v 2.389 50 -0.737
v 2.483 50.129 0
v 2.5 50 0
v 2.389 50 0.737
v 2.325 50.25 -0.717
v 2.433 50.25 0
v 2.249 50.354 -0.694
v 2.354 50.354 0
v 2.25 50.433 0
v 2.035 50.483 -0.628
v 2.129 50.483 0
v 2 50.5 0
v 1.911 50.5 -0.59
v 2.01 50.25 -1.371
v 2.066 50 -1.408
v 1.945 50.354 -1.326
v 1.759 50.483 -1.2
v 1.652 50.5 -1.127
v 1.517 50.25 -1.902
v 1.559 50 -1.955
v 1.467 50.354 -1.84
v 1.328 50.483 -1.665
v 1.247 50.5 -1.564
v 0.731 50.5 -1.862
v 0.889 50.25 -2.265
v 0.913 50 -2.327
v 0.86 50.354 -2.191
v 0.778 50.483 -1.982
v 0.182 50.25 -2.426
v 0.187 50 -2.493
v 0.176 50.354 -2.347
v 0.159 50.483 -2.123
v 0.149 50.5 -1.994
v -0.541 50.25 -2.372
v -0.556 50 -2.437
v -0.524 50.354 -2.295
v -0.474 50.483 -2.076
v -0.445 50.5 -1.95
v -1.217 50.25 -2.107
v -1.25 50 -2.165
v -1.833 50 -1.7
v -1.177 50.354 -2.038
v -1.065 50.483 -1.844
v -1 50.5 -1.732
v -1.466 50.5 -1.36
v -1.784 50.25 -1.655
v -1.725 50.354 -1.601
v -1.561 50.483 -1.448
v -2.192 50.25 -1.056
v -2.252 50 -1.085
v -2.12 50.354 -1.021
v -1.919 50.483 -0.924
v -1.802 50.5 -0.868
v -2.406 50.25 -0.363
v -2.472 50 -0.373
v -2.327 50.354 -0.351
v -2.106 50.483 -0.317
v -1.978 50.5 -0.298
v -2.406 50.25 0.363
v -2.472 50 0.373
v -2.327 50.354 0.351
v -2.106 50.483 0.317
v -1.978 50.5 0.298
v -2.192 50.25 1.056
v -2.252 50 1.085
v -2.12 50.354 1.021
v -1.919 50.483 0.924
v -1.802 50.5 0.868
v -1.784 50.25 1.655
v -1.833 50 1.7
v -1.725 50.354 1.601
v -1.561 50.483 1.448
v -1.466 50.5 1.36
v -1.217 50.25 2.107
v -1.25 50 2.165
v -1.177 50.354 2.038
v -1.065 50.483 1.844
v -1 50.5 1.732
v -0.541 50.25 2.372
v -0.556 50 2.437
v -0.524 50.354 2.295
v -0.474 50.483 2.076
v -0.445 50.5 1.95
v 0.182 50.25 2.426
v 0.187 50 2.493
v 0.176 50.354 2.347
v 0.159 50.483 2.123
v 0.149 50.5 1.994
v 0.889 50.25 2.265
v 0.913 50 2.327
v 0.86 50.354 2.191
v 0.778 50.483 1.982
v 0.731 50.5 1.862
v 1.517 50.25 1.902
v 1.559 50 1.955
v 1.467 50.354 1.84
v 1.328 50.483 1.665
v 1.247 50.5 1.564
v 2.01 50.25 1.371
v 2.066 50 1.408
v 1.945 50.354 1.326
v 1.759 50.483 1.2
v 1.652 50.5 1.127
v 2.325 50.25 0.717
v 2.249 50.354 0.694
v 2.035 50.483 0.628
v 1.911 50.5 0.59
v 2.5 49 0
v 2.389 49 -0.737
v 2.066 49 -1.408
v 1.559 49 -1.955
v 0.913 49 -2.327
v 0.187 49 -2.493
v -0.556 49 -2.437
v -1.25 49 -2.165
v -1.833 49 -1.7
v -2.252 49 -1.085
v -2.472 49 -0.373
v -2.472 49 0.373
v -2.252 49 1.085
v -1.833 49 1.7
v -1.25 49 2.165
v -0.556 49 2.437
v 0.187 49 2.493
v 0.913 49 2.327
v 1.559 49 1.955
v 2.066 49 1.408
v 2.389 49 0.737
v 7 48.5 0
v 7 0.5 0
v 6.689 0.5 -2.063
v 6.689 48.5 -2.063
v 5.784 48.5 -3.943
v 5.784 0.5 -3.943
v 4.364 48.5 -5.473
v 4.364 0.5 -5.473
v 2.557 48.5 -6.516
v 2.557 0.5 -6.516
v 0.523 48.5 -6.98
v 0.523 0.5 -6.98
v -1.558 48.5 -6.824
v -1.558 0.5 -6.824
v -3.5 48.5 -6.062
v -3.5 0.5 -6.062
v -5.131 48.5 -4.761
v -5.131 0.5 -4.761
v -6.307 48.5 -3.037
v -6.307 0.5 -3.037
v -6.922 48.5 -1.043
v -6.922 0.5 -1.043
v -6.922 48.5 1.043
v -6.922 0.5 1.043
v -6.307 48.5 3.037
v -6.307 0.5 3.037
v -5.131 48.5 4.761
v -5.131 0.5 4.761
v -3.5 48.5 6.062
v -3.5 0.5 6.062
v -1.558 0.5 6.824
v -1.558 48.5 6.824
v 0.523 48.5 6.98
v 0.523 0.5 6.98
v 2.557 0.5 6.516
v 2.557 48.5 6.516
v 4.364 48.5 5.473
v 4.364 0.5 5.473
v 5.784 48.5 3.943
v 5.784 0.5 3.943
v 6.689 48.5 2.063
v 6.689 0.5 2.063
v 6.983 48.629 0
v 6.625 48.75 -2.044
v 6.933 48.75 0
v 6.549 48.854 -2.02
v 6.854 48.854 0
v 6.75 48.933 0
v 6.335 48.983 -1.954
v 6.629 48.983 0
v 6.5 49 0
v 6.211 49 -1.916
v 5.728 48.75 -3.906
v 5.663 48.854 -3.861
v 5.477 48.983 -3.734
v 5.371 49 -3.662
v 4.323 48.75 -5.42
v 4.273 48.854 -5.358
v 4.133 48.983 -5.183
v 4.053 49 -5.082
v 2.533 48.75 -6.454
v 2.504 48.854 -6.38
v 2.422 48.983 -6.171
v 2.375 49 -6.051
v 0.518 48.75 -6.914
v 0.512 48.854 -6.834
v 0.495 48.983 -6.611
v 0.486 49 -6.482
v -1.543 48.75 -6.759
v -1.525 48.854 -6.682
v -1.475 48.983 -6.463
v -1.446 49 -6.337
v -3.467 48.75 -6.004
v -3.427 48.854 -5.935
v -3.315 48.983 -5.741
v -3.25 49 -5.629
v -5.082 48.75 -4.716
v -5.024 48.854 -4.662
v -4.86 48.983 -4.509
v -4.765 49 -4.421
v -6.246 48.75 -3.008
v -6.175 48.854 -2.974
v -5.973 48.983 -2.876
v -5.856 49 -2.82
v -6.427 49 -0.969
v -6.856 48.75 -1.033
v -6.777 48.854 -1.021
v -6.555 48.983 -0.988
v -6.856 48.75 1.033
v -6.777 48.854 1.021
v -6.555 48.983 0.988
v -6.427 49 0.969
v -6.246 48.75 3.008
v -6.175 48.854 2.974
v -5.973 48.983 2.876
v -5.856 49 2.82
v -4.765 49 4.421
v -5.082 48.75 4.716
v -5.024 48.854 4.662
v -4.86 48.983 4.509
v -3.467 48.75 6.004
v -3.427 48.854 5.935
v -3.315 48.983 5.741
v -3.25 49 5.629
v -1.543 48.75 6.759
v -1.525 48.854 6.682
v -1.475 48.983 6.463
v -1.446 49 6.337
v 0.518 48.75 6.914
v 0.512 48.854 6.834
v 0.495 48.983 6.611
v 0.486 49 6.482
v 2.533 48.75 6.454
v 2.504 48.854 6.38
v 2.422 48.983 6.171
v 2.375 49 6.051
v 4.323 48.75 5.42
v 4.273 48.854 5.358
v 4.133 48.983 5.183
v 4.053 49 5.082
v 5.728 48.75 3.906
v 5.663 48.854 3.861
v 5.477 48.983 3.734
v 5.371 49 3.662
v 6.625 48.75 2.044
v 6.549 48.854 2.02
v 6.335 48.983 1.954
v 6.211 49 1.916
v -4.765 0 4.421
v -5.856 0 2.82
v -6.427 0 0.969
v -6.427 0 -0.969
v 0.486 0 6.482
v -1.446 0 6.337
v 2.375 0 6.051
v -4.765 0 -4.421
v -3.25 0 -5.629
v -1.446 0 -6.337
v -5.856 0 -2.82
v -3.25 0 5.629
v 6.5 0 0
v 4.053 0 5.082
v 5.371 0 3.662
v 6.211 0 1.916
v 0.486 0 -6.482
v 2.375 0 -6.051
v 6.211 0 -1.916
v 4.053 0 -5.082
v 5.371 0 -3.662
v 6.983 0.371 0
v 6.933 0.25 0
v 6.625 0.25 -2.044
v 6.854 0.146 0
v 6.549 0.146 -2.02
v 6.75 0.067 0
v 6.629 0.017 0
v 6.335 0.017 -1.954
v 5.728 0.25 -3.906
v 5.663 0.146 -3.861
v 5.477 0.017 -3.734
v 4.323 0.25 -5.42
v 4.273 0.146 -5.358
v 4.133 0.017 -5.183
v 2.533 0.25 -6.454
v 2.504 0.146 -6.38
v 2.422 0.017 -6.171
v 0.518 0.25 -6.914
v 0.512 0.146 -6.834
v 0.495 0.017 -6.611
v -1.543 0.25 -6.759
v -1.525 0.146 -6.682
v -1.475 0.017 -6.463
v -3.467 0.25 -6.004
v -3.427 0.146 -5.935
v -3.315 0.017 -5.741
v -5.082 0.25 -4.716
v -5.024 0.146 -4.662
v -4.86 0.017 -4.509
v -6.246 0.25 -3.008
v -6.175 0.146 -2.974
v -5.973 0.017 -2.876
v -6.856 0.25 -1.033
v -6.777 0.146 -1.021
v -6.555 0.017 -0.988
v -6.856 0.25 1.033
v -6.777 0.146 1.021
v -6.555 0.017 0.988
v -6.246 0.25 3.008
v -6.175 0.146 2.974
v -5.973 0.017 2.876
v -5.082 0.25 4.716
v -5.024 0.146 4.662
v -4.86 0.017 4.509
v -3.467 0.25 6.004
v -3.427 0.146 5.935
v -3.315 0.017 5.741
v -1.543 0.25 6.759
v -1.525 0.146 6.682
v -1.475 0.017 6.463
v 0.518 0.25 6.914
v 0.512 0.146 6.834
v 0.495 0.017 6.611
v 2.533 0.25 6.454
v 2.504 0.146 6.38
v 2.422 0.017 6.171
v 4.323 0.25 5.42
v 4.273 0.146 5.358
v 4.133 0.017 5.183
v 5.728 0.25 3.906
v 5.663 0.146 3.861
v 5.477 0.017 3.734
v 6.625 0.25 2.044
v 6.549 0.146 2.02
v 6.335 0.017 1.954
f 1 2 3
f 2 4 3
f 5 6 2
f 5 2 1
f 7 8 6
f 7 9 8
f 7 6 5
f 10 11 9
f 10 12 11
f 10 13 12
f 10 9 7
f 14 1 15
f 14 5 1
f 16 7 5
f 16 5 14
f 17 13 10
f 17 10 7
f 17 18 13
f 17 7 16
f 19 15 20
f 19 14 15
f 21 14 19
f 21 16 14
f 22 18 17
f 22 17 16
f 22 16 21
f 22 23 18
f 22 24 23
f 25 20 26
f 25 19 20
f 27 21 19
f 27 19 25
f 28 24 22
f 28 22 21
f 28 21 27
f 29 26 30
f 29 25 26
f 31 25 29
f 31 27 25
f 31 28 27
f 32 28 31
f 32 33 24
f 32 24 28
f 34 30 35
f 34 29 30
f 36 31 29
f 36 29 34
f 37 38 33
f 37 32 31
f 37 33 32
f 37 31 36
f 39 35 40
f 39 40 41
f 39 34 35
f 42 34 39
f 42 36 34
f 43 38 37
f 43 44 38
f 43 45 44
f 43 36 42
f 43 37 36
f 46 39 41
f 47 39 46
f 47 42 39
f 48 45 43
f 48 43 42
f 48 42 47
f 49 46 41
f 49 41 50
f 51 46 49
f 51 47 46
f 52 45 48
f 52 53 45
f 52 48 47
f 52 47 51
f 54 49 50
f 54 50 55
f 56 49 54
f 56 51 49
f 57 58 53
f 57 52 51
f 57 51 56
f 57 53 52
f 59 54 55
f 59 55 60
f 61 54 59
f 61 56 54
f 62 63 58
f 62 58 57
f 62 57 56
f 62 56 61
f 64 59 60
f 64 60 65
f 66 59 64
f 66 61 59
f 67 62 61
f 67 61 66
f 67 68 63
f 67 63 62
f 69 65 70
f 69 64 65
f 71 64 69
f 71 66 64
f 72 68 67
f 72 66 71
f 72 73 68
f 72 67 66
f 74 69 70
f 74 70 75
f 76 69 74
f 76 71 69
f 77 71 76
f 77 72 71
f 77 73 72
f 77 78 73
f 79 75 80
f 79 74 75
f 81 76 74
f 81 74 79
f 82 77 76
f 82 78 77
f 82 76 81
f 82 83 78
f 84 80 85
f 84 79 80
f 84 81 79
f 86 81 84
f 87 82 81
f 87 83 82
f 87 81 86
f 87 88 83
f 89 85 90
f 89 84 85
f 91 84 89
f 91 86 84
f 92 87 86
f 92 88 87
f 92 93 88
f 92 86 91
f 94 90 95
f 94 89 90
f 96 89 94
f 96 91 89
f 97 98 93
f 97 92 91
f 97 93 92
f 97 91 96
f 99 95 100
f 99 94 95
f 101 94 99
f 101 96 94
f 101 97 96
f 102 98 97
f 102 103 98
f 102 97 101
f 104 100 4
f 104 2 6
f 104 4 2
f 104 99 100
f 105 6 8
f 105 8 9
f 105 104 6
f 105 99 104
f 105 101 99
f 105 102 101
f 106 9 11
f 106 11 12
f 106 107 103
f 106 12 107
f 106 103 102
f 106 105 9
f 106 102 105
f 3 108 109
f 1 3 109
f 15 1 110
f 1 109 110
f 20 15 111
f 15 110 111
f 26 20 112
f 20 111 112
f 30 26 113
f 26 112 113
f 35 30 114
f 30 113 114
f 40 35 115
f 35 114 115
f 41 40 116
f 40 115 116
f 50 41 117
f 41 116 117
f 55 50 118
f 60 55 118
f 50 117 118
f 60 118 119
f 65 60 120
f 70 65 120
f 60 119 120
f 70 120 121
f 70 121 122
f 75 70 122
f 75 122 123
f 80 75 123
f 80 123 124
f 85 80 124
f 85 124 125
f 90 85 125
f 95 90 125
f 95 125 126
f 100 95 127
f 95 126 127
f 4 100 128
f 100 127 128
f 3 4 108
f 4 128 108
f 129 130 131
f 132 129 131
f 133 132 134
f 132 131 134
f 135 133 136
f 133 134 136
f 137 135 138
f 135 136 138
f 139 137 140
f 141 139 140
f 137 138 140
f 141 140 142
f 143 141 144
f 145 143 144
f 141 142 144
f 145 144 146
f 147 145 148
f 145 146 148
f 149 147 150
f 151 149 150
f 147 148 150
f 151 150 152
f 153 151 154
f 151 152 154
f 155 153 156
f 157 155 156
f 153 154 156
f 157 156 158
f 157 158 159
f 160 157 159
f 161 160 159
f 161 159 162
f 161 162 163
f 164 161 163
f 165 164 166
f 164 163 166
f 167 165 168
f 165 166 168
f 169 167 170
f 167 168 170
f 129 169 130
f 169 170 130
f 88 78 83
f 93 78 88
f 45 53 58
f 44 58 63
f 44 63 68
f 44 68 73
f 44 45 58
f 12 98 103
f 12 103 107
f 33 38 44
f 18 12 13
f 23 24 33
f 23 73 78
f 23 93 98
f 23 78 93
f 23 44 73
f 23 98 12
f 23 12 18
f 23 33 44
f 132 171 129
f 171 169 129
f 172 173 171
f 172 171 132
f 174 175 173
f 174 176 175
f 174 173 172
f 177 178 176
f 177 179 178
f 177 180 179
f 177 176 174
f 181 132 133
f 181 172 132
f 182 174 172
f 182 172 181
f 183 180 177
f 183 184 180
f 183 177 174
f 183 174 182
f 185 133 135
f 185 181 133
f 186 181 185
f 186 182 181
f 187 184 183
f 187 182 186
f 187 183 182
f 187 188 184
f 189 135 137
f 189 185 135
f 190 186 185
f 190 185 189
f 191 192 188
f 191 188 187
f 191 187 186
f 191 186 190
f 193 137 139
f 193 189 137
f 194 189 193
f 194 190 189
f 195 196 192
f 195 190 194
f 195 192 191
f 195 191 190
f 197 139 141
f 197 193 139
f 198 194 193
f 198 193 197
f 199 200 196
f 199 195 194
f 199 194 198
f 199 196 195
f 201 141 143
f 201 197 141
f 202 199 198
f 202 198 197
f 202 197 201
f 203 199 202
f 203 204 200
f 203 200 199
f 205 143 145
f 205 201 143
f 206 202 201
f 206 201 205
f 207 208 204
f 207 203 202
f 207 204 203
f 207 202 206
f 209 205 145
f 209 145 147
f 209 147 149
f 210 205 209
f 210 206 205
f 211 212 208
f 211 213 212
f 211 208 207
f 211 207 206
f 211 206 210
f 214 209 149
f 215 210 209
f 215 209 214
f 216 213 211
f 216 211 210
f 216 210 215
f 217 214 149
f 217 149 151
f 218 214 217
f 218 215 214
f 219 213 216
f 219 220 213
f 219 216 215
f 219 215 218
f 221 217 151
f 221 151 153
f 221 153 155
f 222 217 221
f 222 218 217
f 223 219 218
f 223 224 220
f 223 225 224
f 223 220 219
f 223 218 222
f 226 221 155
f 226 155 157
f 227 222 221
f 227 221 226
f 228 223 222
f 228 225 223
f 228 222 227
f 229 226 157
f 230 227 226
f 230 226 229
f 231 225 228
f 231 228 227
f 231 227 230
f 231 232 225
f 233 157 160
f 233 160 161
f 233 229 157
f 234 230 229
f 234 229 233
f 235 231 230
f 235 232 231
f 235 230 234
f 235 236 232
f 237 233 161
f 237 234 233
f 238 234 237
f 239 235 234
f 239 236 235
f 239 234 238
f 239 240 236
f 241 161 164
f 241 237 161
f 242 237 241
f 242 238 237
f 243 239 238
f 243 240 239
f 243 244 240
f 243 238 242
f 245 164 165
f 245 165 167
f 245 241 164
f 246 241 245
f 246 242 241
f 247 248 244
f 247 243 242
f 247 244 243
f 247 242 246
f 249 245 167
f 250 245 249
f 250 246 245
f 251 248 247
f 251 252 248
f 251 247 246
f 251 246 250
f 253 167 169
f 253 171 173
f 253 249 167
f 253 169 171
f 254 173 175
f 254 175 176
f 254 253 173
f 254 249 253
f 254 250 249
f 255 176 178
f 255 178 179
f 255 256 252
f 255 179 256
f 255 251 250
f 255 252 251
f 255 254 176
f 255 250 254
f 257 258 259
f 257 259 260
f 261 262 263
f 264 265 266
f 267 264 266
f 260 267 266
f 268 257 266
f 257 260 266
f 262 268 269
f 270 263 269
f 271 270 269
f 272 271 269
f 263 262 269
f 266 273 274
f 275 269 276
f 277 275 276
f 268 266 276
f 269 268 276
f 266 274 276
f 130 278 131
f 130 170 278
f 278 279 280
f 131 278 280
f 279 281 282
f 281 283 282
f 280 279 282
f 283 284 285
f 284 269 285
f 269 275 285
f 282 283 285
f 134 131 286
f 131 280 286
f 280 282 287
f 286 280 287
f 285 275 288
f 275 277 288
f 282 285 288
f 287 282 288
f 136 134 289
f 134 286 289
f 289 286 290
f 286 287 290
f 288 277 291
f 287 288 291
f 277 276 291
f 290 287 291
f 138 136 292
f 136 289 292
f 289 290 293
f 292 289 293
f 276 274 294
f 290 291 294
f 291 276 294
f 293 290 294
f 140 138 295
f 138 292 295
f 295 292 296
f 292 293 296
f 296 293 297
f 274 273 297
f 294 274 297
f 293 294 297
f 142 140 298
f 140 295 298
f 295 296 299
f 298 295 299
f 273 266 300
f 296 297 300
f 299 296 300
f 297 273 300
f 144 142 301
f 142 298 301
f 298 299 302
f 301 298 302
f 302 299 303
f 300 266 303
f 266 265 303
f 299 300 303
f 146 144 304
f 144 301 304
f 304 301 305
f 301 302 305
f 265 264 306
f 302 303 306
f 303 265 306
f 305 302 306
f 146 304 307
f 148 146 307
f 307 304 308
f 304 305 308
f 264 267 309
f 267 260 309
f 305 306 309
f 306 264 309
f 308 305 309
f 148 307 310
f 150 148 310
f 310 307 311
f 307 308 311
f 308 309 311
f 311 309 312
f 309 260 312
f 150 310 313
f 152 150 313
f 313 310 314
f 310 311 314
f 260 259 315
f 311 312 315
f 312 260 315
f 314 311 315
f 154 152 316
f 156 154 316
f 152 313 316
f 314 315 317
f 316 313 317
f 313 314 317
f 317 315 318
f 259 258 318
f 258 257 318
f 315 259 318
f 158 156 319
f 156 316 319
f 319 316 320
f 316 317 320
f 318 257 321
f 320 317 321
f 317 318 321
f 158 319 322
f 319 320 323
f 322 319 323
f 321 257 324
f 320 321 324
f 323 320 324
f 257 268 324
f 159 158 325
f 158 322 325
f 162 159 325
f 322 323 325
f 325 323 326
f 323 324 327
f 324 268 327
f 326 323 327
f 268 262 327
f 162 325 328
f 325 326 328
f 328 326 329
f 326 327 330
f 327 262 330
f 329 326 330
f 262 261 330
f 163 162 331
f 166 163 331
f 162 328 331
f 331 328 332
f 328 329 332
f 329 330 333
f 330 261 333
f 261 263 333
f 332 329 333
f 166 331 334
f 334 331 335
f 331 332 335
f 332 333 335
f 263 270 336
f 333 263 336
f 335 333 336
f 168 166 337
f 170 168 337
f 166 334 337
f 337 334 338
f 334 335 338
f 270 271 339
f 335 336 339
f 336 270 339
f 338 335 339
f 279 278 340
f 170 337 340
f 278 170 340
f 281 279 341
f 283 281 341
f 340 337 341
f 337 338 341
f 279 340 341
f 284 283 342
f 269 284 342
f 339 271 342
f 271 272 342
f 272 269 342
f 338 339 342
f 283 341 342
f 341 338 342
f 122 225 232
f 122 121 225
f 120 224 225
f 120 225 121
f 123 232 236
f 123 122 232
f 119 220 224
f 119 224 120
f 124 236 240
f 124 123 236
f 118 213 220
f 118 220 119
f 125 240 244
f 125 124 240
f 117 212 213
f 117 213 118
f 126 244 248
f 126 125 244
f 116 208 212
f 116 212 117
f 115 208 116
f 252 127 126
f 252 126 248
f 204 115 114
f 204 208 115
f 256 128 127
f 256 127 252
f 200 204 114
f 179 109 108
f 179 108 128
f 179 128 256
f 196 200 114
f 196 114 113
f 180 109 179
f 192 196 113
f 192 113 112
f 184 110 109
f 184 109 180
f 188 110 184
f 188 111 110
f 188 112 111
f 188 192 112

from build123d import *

# Parameters (mm, degrees)
SKETCH1_R           = 7
BOSS_EXTRUDE1_DEPTH = 49
SKETCH2_R           = 2.5
BOSS_EXTRUDE2_DEPTH = 1.5
FILLET1_R           = 0.5


with BuildPart() as part:
    # Sketch1 → Boss-Extrude1 (new body)
    with BuildSketch(Plane(origin=(0, 0, 0), x_dir=(1, 0, 0), z_dir=(0, 1, 0))):
        Circle(SKETCH1_R)
    extrude(amount=BOSS_EXTRUDE1_DEPTH)

    # Sketch2 → Boss-Extrude2 (add)
    with BuildSketch(Plane(origin=(0, 49, 0), x_dir=(1, 0, 0), z_dir=(0, 1, 0))):
        Circle(SKETCH2_R)
    extrude(amount=BOSS_EXTRUDE2_DEPTH)

    # Fillet1
    fillet1_edges = [part.edges().sort_by_distance(p)[0] for p in [
        (-7, 0, 0),
        (-7, 49, 0),
        (-2.5, 50.5, 0),
    ]]
    fillet(fillet1_edges, radius=FILLET1_R)


solid = part.part
